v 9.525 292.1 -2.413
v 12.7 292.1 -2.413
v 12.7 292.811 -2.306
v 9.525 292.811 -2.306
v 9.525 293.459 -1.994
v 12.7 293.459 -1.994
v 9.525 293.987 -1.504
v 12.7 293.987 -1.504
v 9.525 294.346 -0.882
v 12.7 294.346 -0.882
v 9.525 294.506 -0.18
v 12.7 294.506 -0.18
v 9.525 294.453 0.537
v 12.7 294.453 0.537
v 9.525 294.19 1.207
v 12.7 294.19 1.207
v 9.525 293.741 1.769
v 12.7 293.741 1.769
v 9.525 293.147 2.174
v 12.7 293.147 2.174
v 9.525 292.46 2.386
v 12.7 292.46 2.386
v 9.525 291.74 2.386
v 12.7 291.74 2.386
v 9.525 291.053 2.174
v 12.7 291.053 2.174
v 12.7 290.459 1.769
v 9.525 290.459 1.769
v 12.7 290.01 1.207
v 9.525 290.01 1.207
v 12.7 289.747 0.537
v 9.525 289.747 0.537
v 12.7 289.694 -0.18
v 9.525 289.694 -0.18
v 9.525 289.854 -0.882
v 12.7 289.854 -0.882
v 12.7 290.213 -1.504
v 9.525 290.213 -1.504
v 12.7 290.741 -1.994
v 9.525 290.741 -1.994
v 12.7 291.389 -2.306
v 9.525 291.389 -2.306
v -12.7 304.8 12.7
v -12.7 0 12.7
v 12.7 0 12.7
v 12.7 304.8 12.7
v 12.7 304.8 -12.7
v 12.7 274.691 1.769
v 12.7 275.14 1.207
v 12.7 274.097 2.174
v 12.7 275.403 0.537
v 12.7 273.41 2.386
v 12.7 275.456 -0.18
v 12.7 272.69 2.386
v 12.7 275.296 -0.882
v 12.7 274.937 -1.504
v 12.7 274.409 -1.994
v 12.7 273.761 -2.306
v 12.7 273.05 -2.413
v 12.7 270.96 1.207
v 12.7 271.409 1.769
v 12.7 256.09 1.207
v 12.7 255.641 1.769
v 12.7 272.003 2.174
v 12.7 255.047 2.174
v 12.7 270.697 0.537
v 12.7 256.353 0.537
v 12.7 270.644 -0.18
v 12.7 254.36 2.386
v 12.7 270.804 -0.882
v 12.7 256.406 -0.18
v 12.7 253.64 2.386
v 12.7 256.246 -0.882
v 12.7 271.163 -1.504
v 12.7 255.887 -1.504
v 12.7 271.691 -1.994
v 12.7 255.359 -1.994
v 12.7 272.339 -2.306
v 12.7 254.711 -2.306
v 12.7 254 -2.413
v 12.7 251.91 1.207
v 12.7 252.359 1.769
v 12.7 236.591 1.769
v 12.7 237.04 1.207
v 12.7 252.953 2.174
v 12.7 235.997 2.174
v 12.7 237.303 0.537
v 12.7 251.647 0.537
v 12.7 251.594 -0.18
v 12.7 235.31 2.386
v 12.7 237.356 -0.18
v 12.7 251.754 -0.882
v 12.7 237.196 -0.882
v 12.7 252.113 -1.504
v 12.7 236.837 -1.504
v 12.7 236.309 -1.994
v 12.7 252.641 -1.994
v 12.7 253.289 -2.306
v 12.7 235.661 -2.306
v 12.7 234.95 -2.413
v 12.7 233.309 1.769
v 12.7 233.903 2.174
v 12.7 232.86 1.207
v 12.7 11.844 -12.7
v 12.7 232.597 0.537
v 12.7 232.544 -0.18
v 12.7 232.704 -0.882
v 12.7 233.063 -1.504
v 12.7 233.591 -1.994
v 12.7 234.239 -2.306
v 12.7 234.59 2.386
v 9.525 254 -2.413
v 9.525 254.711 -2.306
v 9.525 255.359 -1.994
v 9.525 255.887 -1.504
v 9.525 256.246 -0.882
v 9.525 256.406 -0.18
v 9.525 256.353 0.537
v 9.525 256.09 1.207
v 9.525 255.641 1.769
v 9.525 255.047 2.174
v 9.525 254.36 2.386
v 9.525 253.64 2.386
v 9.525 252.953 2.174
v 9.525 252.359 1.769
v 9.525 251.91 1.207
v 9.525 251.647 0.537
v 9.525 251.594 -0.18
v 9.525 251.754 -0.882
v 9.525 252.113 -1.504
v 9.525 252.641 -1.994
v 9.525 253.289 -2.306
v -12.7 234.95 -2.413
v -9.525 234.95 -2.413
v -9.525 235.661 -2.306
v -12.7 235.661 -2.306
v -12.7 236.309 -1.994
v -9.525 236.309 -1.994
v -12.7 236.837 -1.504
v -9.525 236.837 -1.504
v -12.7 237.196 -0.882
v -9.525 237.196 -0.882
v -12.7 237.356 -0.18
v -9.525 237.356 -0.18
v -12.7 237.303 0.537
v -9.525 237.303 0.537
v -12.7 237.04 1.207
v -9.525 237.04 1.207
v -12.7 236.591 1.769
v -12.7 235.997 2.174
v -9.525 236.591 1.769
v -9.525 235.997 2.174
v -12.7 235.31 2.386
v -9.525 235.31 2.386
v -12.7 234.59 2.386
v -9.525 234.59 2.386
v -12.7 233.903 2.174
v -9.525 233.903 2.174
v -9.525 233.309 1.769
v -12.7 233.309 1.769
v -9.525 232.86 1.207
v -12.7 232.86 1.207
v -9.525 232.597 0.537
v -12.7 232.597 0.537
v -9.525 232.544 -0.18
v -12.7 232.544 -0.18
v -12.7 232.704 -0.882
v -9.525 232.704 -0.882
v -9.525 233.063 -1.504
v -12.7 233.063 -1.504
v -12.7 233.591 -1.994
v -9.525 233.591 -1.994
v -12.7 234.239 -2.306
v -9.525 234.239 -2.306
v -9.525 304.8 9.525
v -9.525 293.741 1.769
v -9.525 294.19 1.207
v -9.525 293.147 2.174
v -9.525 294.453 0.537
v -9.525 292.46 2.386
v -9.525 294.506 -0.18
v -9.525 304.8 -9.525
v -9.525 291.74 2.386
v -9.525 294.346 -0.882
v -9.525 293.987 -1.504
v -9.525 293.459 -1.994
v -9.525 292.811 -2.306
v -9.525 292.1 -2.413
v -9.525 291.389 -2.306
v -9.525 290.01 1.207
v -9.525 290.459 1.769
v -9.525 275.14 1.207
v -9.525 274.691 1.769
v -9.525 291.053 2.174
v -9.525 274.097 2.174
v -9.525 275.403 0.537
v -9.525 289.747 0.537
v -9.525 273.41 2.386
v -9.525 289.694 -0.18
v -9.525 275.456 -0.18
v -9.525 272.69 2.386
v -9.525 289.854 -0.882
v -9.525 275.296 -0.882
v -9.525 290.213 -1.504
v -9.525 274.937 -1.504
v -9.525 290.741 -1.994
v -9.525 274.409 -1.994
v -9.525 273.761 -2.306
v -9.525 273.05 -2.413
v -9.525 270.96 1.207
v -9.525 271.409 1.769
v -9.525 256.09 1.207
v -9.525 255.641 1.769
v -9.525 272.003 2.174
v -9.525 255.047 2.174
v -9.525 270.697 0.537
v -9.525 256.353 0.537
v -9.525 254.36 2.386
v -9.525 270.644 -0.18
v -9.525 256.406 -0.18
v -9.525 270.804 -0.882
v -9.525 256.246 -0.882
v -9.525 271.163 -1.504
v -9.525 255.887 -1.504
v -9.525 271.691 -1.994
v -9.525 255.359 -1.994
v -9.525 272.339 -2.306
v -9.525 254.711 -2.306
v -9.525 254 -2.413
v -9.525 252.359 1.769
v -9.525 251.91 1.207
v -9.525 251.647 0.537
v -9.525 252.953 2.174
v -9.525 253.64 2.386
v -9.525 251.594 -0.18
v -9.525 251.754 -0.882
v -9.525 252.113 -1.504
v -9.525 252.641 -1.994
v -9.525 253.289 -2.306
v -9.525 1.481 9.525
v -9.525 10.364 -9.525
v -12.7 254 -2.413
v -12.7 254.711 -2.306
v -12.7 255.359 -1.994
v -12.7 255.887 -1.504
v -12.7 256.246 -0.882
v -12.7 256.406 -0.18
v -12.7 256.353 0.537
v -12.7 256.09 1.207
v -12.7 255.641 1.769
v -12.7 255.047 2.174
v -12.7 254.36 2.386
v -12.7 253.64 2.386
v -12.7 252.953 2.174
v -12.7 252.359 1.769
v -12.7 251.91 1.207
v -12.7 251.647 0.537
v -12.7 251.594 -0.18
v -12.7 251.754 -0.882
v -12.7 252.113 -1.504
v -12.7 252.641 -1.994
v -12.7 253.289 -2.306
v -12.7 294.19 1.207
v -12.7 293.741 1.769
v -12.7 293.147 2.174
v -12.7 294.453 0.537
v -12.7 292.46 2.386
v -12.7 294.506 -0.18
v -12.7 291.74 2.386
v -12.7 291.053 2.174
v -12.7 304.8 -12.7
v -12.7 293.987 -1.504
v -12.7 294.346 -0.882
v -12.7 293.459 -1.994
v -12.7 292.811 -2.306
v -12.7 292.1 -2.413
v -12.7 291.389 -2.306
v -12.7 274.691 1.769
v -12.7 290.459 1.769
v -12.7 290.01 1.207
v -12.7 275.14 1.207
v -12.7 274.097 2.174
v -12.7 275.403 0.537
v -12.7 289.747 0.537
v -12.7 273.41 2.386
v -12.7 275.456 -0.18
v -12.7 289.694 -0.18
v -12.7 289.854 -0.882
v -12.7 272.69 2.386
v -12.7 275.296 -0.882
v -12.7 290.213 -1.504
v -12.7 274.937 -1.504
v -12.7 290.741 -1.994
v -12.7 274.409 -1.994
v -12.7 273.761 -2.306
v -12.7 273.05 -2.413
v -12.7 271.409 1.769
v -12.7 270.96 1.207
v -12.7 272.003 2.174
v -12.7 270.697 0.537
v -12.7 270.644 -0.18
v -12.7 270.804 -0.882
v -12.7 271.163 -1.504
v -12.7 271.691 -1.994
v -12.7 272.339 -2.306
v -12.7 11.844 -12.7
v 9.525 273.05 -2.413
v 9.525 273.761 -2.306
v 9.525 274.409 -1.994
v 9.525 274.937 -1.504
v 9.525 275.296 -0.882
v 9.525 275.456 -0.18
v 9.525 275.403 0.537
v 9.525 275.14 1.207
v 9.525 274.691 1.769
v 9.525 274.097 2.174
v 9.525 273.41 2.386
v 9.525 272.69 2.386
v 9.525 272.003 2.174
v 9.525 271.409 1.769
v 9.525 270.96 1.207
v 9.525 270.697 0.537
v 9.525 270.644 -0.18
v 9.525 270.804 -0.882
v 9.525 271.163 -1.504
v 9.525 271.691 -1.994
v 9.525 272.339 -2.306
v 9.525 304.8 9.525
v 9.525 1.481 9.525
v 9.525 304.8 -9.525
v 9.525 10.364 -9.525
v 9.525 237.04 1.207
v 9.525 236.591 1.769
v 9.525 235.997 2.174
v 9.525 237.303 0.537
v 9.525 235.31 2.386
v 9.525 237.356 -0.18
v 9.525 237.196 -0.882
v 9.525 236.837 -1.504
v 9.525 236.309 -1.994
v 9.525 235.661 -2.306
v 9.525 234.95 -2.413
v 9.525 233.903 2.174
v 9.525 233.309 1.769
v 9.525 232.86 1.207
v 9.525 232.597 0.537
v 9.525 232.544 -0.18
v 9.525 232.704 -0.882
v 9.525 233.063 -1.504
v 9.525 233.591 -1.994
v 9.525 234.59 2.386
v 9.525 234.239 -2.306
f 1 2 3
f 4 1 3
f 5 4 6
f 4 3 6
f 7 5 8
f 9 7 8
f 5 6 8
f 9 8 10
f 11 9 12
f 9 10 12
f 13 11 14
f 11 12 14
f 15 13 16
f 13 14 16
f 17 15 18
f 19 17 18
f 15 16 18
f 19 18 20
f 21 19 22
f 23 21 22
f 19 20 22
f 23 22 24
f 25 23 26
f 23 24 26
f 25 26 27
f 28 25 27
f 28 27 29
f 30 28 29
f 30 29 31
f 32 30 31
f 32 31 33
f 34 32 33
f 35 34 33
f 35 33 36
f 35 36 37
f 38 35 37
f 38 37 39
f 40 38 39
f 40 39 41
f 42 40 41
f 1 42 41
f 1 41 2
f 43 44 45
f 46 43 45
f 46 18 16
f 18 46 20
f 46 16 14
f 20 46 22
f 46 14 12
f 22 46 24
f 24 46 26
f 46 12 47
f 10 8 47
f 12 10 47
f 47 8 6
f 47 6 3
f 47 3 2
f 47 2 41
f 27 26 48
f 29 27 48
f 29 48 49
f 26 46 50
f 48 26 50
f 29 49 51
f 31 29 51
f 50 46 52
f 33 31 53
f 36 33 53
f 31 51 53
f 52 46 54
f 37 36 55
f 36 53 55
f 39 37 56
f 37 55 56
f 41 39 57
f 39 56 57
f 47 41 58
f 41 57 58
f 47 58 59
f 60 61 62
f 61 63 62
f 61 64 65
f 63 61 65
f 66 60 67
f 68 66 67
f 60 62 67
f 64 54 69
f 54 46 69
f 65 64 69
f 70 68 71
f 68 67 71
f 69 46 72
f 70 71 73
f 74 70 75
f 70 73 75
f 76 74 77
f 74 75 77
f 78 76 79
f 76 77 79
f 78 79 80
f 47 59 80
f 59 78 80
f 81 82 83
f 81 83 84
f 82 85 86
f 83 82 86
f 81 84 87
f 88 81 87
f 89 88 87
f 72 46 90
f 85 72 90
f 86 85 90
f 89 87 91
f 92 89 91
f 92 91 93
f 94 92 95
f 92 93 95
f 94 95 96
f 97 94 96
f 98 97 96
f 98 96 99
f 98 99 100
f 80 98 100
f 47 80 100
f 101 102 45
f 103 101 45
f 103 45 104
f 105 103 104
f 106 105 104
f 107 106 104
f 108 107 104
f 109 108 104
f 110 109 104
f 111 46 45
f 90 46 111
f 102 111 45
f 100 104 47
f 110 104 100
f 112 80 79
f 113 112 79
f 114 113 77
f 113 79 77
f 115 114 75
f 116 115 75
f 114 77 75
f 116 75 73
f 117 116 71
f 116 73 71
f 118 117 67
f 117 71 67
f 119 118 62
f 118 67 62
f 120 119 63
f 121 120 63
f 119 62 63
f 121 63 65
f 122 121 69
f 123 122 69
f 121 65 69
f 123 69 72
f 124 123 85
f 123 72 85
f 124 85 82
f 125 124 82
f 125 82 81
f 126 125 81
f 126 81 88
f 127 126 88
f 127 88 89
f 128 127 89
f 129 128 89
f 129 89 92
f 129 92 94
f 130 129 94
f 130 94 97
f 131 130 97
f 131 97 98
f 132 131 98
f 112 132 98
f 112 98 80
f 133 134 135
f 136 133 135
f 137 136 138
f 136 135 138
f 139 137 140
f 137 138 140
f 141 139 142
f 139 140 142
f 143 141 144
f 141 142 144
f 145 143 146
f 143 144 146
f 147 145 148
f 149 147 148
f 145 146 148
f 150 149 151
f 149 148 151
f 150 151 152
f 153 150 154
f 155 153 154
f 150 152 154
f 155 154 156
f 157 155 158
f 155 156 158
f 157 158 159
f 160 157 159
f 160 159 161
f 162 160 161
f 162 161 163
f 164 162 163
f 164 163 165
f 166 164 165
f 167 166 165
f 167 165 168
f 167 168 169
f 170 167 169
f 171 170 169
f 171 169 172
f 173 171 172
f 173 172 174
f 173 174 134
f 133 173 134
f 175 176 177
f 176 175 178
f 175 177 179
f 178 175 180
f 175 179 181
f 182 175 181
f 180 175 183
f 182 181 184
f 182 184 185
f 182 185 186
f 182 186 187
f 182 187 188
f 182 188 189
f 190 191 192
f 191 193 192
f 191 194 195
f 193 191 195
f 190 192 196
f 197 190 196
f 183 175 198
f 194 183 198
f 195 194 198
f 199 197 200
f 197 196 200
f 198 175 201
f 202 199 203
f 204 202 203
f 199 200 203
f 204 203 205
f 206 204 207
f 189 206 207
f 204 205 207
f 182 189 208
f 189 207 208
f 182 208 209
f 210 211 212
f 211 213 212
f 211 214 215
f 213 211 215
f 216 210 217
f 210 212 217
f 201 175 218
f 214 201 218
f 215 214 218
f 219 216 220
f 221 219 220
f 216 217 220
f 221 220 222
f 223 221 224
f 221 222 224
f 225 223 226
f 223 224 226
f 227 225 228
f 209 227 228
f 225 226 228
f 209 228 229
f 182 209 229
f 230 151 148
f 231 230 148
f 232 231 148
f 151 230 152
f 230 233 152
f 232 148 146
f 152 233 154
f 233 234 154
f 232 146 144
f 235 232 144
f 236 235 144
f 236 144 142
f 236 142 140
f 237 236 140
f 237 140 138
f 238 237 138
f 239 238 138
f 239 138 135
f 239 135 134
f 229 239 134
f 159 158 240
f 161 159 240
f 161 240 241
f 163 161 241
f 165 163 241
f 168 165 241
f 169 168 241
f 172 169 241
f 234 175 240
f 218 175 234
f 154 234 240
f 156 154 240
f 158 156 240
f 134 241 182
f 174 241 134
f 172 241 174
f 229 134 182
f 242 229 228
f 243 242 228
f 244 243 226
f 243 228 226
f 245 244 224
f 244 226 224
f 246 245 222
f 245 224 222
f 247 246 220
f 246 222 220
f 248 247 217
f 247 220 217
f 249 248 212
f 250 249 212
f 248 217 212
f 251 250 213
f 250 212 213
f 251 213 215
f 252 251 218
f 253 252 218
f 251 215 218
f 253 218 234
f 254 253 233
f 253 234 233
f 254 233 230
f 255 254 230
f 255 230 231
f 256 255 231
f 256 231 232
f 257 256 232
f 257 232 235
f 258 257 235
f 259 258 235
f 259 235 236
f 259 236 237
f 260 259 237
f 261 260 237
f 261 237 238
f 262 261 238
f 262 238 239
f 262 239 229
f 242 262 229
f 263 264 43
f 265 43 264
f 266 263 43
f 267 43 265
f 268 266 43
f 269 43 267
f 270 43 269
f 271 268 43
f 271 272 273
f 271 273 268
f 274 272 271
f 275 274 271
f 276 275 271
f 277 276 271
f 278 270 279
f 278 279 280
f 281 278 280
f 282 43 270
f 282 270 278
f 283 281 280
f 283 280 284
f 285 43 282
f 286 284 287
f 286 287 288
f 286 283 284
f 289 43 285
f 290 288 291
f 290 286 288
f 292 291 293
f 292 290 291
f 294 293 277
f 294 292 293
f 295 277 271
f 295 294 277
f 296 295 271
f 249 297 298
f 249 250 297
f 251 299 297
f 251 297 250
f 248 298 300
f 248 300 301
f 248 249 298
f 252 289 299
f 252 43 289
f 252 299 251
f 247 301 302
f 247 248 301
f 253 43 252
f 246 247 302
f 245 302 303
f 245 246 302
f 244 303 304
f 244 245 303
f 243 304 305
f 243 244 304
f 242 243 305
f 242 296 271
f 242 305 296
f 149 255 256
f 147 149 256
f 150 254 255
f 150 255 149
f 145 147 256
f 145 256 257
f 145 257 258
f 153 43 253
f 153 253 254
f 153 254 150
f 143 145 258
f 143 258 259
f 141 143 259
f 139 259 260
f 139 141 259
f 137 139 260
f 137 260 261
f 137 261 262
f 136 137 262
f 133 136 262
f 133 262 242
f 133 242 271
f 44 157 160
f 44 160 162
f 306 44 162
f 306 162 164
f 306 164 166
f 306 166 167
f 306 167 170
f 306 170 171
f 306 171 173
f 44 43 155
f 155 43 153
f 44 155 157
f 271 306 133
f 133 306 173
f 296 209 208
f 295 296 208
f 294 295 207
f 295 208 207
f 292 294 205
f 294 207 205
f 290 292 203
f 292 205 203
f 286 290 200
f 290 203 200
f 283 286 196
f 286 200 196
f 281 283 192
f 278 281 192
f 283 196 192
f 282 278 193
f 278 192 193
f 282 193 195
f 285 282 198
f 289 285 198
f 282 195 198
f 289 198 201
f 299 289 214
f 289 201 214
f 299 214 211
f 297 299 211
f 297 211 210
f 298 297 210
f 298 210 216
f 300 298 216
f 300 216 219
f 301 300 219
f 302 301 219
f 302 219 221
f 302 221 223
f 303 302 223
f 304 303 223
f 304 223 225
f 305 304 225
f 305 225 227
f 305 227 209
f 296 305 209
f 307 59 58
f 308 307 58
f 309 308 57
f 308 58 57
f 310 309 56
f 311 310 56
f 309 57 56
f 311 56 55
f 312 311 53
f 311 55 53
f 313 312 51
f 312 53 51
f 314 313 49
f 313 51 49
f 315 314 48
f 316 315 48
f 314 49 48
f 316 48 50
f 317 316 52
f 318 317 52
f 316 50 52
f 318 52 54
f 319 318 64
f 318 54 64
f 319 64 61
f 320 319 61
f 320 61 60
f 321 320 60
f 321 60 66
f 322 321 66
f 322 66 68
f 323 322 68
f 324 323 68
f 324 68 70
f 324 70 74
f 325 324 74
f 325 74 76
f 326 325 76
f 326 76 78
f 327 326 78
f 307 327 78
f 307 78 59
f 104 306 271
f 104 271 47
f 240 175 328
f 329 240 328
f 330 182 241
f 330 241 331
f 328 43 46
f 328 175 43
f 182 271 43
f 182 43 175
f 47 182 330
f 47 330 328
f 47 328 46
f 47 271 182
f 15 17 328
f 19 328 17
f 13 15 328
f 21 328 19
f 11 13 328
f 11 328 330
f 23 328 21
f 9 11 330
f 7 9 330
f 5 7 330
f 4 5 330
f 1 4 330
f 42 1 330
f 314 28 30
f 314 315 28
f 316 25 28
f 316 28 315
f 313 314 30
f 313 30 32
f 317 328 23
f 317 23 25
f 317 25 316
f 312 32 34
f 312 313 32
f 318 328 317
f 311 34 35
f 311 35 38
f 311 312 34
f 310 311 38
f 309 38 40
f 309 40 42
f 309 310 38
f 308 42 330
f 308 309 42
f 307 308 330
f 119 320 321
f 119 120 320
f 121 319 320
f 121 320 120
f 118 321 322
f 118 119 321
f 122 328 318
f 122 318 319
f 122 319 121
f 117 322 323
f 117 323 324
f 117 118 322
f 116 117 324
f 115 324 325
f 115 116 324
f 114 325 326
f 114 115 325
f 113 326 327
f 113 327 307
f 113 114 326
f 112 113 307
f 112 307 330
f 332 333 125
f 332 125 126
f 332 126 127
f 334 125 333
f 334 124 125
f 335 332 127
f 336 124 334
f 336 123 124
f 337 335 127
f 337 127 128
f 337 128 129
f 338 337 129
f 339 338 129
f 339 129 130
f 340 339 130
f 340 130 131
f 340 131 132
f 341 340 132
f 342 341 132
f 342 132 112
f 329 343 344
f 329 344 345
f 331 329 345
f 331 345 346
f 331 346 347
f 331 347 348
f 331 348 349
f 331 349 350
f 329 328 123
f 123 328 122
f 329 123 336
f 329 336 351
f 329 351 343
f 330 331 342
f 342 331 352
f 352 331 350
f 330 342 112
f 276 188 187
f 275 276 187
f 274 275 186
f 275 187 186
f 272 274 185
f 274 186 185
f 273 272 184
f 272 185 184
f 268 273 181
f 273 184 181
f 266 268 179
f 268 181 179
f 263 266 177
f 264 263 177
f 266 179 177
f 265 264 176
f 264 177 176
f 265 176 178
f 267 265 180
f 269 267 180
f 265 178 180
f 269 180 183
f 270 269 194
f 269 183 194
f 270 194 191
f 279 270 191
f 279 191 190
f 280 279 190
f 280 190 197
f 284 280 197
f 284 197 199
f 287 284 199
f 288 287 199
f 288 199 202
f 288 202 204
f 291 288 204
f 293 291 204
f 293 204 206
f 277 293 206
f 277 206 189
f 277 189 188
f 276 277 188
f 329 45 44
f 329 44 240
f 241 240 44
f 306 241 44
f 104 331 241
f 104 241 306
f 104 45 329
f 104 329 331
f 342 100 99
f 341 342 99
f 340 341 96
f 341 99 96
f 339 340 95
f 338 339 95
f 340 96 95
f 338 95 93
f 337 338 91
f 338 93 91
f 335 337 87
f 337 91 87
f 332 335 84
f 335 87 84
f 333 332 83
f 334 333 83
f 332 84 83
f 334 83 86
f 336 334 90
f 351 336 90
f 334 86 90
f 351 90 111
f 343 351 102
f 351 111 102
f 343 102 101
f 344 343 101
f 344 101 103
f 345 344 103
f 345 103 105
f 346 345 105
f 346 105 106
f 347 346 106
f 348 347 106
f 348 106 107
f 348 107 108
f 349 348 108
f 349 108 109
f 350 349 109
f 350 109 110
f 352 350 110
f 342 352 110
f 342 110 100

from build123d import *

# Parameters (mm, degrees)
SKETCH1_W           = 25.4
SKETCH1_H           = 25.4
SKETCH1_W_2         = 19.05
SKETCH1_H_2         = 19.05
BOSS_EXTRUDE1_DEPTH = 304.8
SKETCH2_R           = 2.413
CUT_EXTRUDE1_DEPTH  = 25.4


with BuildPart() as part:
    # Sketch1 → Boss-Extrude1 (new body)
    with BuildSketch(Plane(origin=(0, 0, 0), x_dir=(1, 0, 0), z_dir=(0, 1, 0))):
        Rectangle(SKETCH1_W, SKETCH1_H)
        Rectangle(SKETCH1_W_2, SKETCH1_H_2, mode=Mode.SUBTRACT)
    extrude(amount=BOSS_EXTRUDE1_DEPTH)

    # Sketch2 → Cut-Extrude1 (cut)
    with BuildSketch(Plane(origin=(12.7, 0, 0), x_dir=(0, 0, -1), z_dir=(1, 0, 0))):
        with Locations((0, 292.1)):
            Circle(SKETCH2_R)
        with Locations((0, 273.05)):
            Circle(SKETCH2_R)
        with Locations((0, 254)):
            Circle(SKETCH2_R)
        with Locations((0, 234.95)):
            Circle(SKETCH2_R)
        Polygon((-12.7, 0), (12.7, 11.844214517), (12.7, 0), align=None)
    extrude(amount=-CUT_EXTRUDE1_DEPTH, mode=Mode.SUBTRACT)


solid = part.part
